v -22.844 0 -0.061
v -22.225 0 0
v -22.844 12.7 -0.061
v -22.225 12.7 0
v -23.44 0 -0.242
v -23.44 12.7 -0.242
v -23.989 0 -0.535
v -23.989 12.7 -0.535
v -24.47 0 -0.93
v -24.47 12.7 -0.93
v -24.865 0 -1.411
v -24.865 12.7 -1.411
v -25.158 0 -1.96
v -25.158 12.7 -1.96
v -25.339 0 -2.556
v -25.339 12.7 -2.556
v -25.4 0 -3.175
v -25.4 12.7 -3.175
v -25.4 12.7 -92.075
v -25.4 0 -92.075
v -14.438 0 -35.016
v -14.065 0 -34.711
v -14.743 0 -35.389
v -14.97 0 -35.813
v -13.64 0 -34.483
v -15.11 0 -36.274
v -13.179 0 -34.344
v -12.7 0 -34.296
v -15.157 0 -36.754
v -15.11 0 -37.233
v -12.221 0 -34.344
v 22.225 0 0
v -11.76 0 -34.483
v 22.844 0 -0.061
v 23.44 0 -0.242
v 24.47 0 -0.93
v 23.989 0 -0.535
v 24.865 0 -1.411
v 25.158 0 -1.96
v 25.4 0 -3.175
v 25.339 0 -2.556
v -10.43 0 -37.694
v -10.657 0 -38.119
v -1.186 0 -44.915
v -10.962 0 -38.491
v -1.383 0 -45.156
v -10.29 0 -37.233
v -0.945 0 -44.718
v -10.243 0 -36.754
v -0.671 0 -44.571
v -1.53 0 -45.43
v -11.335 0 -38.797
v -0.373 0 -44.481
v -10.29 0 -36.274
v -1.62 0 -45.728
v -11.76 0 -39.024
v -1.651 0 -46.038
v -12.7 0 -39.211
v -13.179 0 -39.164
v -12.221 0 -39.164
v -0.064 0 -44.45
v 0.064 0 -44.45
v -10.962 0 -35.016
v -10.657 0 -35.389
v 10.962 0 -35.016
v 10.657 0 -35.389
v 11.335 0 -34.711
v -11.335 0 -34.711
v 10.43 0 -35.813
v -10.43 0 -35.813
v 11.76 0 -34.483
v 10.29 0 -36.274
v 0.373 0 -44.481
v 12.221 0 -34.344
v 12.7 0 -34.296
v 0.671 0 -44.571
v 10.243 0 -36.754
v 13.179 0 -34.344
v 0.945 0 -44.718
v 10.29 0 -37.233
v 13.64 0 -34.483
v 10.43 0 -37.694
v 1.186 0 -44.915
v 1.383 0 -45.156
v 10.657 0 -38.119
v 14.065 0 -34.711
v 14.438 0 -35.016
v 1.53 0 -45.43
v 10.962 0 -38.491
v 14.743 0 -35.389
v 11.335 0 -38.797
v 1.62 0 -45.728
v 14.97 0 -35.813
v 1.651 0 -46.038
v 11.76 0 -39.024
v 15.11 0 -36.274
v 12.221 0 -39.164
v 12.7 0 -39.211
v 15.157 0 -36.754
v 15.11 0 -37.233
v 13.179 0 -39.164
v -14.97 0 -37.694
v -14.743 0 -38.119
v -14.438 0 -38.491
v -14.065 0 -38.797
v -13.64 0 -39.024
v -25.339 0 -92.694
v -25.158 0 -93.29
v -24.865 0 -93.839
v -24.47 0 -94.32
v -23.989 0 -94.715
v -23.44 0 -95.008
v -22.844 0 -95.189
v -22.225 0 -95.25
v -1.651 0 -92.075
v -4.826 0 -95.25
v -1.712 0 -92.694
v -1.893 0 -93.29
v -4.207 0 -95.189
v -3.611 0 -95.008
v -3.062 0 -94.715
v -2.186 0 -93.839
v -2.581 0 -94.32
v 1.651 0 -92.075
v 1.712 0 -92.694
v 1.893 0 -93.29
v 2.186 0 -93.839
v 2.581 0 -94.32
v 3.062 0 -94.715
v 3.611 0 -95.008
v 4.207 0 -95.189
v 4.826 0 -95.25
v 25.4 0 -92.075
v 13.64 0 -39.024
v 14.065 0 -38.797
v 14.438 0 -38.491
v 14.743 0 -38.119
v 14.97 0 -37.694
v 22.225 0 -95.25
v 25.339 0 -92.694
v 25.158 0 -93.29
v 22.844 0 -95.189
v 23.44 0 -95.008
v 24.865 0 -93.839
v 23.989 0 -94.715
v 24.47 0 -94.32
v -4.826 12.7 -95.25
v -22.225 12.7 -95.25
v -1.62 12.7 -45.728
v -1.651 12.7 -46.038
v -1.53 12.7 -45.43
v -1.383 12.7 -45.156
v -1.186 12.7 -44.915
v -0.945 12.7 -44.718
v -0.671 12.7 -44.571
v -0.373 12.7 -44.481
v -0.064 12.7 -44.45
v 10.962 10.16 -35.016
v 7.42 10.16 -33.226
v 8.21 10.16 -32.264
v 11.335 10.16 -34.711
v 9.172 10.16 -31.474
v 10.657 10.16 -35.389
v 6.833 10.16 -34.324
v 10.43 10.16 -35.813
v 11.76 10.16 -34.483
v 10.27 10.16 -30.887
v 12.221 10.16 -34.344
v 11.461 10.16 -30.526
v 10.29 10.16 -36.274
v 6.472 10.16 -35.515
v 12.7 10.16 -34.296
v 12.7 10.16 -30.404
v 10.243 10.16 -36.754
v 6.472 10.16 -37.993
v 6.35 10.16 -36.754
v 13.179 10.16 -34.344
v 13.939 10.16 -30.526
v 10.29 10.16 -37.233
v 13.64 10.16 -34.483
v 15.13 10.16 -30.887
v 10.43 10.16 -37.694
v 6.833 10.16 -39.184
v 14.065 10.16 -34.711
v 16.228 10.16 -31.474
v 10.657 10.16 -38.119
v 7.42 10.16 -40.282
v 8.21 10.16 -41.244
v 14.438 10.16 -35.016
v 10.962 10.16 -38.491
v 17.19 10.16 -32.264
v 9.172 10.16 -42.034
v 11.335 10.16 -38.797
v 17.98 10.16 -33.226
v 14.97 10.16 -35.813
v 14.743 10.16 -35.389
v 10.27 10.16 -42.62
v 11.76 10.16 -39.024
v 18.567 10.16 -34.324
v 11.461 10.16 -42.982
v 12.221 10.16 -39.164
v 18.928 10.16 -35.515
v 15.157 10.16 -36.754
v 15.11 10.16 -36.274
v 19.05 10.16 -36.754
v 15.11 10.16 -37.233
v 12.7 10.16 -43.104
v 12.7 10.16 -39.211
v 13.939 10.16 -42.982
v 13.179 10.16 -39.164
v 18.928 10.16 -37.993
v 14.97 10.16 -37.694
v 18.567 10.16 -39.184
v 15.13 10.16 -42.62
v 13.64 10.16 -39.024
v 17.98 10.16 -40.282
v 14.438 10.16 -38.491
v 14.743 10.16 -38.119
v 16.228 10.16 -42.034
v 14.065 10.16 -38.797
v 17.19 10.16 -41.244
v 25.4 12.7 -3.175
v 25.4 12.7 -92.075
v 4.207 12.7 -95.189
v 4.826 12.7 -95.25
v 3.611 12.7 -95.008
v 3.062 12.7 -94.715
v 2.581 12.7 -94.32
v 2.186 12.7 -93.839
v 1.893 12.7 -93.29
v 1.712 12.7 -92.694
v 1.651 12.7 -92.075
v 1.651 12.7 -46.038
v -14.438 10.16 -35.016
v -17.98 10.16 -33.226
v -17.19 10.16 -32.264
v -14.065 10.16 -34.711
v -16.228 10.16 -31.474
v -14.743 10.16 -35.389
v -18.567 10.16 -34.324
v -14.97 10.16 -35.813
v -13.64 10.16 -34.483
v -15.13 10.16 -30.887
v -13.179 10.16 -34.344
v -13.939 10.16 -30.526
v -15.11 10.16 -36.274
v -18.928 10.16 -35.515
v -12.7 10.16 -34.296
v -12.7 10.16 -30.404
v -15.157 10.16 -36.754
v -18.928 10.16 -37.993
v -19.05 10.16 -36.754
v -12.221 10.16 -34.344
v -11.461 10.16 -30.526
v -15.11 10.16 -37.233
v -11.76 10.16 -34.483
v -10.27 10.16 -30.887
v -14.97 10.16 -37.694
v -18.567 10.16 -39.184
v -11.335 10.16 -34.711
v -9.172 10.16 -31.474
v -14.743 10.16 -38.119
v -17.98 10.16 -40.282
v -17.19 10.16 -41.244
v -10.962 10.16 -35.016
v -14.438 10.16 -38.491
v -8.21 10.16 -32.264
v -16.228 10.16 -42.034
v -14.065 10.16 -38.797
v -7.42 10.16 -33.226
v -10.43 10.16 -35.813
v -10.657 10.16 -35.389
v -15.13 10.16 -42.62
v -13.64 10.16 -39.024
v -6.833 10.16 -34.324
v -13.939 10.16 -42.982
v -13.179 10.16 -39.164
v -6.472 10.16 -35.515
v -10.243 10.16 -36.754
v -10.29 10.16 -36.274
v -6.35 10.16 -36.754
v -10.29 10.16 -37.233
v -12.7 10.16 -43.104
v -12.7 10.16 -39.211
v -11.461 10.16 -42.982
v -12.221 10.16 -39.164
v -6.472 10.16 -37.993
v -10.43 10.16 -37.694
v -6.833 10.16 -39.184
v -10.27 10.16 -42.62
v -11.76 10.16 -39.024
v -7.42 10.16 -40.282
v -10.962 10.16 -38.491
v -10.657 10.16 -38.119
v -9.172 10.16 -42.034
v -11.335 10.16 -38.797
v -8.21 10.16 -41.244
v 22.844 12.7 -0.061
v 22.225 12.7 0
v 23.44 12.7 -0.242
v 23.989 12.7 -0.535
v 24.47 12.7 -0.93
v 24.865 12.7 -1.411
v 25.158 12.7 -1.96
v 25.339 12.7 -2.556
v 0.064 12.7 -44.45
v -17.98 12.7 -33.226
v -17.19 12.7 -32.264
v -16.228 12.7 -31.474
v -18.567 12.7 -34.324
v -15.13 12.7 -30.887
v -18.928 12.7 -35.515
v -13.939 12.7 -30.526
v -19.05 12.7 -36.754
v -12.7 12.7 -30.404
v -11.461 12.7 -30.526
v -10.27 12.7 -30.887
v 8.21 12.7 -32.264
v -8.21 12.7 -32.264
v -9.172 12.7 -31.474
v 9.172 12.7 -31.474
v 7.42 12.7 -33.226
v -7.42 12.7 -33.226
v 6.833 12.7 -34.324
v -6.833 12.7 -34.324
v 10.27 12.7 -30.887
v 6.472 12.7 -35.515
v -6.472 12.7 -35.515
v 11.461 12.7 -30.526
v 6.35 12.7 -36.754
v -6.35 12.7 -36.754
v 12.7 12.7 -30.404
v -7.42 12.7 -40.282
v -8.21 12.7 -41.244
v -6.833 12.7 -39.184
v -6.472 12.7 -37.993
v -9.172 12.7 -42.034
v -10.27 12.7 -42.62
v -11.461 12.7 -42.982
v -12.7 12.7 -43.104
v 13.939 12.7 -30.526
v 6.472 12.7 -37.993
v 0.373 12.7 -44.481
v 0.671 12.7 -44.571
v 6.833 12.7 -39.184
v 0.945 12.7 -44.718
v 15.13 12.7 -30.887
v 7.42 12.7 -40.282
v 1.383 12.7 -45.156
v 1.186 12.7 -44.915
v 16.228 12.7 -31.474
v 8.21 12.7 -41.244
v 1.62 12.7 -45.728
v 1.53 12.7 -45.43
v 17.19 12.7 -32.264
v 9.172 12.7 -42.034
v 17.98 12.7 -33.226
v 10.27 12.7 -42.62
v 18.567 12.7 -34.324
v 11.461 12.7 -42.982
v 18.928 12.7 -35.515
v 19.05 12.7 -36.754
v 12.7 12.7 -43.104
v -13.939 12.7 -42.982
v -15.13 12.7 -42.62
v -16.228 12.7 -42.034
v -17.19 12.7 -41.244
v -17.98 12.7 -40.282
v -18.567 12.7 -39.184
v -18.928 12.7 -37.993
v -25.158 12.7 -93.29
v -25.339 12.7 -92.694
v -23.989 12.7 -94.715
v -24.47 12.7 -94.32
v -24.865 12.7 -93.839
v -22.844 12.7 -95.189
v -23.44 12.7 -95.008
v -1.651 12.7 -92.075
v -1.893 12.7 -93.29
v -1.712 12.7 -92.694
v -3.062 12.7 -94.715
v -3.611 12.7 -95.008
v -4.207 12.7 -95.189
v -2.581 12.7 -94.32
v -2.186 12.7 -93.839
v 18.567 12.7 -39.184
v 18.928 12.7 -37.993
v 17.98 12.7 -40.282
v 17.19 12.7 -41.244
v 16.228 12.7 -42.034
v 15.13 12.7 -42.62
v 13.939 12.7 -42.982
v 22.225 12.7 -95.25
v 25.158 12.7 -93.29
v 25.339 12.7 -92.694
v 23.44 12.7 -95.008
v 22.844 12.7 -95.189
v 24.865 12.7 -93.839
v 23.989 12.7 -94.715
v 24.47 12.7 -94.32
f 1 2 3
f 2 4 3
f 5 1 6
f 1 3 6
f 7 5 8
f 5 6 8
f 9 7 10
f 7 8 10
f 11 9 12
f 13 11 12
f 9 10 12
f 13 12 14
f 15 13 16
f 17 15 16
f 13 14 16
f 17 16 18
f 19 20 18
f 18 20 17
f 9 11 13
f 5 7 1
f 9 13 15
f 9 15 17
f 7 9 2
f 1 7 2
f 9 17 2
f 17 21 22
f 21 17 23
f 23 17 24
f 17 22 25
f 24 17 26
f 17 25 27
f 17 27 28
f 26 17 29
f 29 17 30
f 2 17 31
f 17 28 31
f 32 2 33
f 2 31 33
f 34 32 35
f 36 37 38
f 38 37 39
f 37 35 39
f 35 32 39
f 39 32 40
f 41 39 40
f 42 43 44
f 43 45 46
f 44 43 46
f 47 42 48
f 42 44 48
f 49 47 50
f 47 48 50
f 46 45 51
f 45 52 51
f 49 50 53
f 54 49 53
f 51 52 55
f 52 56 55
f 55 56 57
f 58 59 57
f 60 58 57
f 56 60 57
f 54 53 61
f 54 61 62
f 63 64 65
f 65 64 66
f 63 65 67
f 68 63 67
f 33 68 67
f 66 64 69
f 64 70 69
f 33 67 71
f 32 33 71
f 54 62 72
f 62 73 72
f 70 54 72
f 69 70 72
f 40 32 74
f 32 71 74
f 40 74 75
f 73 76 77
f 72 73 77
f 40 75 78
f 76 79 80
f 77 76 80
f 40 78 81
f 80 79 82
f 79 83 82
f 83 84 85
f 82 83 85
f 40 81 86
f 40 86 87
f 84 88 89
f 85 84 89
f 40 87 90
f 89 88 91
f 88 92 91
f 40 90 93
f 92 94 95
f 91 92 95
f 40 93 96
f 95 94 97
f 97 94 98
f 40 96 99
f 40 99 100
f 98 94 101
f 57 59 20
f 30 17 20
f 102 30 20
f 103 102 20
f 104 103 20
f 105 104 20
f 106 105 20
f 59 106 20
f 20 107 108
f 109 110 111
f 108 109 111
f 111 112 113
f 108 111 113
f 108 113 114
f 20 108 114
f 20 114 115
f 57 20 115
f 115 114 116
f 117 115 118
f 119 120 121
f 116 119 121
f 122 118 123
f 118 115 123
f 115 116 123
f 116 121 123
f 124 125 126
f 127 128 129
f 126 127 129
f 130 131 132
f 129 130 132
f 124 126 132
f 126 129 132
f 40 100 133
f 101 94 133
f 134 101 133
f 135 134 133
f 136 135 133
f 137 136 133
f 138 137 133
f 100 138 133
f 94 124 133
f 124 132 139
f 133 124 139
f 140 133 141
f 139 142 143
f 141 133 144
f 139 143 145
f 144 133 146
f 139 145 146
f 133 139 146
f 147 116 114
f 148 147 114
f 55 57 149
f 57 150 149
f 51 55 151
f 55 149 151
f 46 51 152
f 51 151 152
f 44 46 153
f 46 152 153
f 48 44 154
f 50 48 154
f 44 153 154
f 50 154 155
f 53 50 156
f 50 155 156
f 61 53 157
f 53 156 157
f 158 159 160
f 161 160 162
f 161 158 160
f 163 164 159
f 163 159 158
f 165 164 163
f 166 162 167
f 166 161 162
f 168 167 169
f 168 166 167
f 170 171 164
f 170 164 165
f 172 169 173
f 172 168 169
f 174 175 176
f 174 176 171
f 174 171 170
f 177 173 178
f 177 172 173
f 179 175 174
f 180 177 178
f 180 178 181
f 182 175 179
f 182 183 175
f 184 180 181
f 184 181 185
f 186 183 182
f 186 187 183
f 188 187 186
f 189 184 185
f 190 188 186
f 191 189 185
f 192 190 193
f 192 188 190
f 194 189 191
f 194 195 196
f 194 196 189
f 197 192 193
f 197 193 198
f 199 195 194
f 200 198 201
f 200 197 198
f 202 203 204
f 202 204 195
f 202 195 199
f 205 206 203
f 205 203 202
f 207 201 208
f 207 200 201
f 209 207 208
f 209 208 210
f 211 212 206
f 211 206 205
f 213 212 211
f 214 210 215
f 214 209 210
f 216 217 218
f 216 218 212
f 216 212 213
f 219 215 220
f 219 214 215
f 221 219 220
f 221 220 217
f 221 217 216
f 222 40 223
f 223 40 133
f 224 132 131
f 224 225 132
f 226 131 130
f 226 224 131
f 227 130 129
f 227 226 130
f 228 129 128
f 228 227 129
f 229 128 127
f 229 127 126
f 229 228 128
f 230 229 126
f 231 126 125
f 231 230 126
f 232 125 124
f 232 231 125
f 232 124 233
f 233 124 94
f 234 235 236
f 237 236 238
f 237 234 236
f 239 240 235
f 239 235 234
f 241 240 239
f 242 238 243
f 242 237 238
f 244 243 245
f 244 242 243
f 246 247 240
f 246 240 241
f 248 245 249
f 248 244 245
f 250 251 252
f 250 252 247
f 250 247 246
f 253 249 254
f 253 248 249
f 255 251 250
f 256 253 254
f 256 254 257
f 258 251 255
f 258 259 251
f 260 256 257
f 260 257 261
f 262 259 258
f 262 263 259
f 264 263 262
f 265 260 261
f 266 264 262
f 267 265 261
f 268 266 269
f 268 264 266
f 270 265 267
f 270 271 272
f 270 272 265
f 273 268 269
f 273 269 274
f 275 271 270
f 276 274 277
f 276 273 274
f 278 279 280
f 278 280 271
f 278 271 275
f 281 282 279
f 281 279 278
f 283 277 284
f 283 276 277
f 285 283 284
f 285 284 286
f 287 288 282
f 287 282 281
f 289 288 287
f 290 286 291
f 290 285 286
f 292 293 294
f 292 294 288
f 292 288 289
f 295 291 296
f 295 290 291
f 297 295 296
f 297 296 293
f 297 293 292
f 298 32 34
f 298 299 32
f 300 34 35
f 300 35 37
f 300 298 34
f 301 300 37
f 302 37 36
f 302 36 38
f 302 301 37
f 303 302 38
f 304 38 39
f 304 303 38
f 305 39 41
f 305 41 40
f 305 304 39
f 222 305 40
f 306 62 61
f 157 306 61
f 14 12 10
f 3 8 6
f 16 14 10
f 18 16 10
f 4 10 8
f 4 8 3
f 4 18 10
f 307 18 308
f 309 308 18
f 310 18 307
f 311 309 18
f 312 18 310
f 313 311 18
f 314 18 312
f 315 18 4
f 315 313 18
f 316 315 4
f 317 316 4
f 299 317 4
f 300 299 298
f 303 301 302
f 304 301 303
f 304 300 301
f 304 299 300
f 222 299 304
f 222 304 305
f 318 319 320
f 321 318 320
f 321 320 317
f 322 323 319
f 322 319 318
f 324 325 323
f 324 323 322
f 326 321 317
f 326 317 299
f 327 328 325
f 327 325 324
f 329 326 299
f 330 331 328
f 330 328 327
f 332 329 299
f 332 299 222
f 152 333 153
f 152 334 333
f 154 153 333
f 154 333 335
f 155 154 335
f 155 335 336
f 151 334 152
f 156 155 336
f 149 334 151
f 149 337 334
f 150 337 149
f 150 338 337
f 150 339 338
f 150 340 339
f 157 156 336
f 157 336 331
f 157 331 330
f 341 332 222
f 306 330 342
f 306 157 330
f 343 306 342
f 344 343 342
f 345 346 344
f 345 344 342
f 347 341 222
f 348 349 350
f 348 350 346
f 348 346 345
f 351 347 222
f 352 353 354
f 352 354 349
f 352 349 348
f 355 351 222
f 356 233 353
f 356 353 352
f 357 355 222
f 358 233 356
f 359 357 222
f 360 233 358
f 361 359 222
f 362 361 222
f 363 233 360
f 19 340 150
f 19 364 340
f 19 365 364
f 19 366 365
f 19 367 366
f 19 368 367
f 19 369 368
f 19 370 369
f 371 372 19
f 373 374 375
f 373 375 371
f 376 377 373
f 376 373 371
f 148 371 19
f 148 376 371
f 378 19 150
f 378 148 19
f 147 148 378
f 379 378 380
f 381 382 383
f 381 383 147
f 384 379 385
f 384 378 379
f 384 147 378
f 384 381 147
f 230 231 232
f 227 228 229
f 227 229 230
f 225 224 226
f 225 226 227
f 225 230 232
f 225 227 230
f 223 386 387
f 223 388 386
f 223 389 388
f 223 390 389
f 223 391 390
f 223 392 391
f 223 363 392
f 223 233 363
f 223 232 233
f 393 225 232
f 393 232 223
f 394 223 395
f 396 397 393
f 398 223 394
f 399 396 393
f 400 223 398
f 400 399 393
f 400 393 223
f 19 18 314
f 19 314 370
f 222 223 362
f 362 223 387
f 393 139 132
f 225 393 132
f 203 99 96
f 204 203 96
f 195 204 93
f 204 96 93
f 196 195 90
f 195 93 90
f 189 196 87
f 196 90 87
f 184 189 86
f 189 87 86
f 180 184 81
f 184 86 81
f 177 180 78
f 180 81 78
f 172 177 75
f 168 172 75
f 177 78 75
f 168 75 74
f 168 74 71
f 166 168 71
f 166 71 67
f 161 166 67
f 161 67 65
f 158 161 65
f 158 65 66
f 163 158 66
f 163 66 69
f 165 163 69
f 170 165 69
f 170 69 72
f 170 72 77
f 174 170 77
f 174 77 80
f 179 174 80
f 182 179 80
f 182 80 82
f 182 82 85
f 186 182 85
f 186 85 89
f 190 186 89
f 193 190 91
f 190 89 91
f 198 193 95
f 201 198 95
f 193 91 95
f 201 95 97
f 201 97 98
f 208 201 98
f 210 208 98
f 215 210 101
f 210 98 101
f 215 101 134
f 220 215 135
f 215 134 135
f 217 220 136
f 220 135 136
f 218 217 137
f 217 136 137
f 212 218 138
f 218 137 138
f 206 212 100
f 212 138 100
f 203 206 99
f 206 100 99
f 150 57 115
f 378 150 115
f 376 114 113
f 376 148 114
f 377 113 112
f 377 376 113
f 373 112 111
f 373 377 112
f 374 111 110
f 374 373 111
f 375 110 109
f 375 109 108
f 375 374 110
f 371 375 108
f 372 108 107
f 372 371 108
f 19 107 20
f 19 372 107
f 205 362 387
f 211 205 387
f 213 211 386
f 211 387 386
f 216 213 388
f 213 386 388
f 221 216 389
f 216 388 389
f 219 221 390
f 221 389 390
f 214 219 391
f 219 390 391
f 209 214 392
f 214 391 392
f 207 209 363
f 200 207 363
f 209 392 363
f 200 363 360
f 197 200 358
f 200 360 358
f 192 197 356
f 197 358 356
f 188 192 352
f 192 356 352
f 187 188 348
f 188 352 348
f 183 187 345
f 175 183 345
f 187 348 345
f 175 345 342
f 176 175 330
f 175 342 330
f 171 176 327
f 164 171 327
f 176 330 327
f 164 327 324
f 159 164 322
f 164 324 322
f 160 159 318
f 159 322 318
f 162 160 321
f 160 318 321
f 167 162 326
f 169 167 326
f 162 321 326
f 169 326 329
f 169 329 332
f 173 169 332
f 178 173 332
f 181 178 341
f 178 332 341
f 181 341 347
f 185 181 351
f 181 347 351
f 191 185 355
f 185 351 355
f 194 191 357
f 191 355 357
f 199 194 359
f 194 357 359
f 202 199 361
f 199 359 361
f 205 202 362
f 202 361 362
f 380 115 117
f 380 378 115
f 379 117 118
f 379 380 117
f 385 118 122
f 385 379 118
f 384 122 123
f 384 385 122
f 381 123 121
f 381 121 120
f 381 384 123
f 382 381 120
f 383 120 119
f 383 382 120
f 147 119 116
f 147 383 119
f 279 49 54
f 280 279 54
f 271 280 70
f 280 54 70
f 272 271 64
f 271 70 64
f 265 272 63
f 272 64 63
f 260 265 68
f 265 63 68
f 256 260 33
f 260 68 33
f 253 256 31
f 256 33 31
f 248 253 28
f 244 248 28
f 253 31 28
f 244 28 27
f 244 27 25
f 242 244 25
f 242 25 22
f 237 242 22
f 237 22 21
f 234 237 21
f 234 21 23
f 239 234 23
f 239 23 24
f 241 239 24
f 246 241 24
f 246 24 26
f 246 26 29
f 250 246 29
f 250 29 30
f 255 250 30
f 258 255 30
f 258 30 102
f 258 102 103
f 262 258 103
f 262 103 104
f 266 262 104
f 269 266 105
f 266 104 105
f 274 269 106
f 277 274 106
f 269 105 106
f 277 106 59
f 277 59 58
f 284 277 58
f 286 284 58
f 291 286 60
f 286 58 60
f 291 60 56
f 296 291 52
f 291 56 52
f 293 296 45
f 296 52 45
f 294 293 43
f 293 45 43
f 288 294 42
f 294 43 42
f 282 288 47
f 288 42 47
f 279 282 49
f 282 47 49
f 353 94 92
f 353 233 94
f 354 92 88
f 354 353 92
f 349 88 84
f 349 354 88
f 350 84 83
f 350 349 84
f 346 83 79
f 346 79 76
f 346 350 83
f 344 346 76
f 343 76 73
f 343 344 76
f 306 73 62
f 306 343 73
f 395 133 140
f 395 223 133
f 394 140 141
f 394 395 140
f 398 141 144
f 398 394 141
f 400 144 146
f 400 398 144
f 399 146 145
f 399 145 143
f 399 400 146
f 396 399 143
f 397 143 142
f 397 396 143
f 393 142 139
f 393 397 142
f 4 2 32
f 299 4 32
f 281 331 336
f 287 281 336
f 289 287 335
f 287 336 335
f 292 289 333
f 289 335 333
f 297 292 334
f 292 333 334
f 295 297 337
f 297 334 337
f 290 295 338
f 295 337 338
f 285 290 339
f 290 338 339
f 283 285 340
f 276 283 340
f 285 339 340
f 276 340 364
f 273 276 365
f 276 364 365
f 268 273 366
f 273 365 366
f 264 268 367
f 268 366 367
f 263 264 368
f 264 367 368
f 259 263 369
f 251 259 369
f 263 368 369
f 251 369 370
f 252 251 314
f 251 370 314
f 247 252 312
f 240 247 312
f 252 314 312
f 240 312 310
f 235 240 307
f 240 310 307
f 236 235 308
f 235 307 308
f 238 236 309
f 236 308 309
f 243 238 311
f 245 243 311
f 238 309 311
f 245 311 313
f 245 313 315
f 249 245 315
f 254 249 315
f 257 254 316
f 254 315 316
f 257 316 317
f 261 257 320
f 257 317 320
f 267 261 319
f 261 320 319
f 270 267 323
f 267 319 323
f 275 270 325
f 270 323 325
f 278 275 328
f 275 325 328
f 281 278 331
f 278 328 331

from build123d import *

# Parameters (mm, degrees)
BOSS_EXTRUDE1_DEPTH = 12.7
FILLET1_R           = 3.175
FILLET2_R           = 1.5875
SKETCH2_R           = 2.45745
CUT_EXTRUDE1_DEPTH  = 13.7
SKETCH3_R           = 6.35
CUT_EXTRUDE2_DEPTH  = 2.54


with BuildPart() as part:
    # Sketch1 → Boss-Extrude1 (new body)
    with BuildSketch(Plane(origin=(0, 0, 0), x_dir=(1, 0, 0), z_dir=(0, 1, 0))):
        Polygon((-25.4, 0), (25.4, 0), (25.4, 95.25), (1.651, 95.25), (1.651, 44.45), (-1.651, 44.45), (-1.651, 95.25), (-25.4, 95.25), align=None)
    extrude(amount=BOSS_EXTRUDE1_DEPTH)

    # Fillet1
    fillet1_edges = [part.edges().sort_by_distance(p)[0] for p in [
        (-25.4, 6.35, -95.25),
        (-1.651, 6.35, -95.25),
        (1.651, 6.35, -95.25),
        (25.4, 6.35, -95.25),
        (25.4, 6.35, 0),
        (-25.4, 6.35, 0),
    ]]
    fillet(fillet1_edges, radius=FILLET1_R)

    # Fillet2
    fillet2_edges = [part.edges().sort_by_distance(p)[0] for p in [
        (-1.651, 6.35, -44.45),
        (1.651, 6.35, -44.45),
    ]]
    fillet(fillet2_edges, radius=FILLET2_R)

    # Sketch2 → Cut-Extrude1 (cut, through all)
    with BuildSketch(Plane.XZ):
        with Locations((-12.7, -36.7538)):
            Circle(SKETCH2_R)
        with Locations((12.7, -36.7538)):
            Circle(SKETCH2_R)
    extrude(amount=-CUT_EXTRUDE1_DEPTH, mode=Mode.SUBTRACT)

    # Sketch3 → Cut-Extrude2 (cut)
    with BuildSketch(Plane(origin=(0, 12.7, 0), x_dir=(1, 0, 0), z_dir=(0, 1, 0))):
        with Locations((12.7, 36.7538)):
            Circle(SKETCH3_R)
        with Locations((-12.7, 36.7538)):
            Circle(SKETCH3_R)
    extrude(amount=-CUT_EXTRUDE2_DEPTH, mode=Mode.SUBTRACT)


solid = part.part
